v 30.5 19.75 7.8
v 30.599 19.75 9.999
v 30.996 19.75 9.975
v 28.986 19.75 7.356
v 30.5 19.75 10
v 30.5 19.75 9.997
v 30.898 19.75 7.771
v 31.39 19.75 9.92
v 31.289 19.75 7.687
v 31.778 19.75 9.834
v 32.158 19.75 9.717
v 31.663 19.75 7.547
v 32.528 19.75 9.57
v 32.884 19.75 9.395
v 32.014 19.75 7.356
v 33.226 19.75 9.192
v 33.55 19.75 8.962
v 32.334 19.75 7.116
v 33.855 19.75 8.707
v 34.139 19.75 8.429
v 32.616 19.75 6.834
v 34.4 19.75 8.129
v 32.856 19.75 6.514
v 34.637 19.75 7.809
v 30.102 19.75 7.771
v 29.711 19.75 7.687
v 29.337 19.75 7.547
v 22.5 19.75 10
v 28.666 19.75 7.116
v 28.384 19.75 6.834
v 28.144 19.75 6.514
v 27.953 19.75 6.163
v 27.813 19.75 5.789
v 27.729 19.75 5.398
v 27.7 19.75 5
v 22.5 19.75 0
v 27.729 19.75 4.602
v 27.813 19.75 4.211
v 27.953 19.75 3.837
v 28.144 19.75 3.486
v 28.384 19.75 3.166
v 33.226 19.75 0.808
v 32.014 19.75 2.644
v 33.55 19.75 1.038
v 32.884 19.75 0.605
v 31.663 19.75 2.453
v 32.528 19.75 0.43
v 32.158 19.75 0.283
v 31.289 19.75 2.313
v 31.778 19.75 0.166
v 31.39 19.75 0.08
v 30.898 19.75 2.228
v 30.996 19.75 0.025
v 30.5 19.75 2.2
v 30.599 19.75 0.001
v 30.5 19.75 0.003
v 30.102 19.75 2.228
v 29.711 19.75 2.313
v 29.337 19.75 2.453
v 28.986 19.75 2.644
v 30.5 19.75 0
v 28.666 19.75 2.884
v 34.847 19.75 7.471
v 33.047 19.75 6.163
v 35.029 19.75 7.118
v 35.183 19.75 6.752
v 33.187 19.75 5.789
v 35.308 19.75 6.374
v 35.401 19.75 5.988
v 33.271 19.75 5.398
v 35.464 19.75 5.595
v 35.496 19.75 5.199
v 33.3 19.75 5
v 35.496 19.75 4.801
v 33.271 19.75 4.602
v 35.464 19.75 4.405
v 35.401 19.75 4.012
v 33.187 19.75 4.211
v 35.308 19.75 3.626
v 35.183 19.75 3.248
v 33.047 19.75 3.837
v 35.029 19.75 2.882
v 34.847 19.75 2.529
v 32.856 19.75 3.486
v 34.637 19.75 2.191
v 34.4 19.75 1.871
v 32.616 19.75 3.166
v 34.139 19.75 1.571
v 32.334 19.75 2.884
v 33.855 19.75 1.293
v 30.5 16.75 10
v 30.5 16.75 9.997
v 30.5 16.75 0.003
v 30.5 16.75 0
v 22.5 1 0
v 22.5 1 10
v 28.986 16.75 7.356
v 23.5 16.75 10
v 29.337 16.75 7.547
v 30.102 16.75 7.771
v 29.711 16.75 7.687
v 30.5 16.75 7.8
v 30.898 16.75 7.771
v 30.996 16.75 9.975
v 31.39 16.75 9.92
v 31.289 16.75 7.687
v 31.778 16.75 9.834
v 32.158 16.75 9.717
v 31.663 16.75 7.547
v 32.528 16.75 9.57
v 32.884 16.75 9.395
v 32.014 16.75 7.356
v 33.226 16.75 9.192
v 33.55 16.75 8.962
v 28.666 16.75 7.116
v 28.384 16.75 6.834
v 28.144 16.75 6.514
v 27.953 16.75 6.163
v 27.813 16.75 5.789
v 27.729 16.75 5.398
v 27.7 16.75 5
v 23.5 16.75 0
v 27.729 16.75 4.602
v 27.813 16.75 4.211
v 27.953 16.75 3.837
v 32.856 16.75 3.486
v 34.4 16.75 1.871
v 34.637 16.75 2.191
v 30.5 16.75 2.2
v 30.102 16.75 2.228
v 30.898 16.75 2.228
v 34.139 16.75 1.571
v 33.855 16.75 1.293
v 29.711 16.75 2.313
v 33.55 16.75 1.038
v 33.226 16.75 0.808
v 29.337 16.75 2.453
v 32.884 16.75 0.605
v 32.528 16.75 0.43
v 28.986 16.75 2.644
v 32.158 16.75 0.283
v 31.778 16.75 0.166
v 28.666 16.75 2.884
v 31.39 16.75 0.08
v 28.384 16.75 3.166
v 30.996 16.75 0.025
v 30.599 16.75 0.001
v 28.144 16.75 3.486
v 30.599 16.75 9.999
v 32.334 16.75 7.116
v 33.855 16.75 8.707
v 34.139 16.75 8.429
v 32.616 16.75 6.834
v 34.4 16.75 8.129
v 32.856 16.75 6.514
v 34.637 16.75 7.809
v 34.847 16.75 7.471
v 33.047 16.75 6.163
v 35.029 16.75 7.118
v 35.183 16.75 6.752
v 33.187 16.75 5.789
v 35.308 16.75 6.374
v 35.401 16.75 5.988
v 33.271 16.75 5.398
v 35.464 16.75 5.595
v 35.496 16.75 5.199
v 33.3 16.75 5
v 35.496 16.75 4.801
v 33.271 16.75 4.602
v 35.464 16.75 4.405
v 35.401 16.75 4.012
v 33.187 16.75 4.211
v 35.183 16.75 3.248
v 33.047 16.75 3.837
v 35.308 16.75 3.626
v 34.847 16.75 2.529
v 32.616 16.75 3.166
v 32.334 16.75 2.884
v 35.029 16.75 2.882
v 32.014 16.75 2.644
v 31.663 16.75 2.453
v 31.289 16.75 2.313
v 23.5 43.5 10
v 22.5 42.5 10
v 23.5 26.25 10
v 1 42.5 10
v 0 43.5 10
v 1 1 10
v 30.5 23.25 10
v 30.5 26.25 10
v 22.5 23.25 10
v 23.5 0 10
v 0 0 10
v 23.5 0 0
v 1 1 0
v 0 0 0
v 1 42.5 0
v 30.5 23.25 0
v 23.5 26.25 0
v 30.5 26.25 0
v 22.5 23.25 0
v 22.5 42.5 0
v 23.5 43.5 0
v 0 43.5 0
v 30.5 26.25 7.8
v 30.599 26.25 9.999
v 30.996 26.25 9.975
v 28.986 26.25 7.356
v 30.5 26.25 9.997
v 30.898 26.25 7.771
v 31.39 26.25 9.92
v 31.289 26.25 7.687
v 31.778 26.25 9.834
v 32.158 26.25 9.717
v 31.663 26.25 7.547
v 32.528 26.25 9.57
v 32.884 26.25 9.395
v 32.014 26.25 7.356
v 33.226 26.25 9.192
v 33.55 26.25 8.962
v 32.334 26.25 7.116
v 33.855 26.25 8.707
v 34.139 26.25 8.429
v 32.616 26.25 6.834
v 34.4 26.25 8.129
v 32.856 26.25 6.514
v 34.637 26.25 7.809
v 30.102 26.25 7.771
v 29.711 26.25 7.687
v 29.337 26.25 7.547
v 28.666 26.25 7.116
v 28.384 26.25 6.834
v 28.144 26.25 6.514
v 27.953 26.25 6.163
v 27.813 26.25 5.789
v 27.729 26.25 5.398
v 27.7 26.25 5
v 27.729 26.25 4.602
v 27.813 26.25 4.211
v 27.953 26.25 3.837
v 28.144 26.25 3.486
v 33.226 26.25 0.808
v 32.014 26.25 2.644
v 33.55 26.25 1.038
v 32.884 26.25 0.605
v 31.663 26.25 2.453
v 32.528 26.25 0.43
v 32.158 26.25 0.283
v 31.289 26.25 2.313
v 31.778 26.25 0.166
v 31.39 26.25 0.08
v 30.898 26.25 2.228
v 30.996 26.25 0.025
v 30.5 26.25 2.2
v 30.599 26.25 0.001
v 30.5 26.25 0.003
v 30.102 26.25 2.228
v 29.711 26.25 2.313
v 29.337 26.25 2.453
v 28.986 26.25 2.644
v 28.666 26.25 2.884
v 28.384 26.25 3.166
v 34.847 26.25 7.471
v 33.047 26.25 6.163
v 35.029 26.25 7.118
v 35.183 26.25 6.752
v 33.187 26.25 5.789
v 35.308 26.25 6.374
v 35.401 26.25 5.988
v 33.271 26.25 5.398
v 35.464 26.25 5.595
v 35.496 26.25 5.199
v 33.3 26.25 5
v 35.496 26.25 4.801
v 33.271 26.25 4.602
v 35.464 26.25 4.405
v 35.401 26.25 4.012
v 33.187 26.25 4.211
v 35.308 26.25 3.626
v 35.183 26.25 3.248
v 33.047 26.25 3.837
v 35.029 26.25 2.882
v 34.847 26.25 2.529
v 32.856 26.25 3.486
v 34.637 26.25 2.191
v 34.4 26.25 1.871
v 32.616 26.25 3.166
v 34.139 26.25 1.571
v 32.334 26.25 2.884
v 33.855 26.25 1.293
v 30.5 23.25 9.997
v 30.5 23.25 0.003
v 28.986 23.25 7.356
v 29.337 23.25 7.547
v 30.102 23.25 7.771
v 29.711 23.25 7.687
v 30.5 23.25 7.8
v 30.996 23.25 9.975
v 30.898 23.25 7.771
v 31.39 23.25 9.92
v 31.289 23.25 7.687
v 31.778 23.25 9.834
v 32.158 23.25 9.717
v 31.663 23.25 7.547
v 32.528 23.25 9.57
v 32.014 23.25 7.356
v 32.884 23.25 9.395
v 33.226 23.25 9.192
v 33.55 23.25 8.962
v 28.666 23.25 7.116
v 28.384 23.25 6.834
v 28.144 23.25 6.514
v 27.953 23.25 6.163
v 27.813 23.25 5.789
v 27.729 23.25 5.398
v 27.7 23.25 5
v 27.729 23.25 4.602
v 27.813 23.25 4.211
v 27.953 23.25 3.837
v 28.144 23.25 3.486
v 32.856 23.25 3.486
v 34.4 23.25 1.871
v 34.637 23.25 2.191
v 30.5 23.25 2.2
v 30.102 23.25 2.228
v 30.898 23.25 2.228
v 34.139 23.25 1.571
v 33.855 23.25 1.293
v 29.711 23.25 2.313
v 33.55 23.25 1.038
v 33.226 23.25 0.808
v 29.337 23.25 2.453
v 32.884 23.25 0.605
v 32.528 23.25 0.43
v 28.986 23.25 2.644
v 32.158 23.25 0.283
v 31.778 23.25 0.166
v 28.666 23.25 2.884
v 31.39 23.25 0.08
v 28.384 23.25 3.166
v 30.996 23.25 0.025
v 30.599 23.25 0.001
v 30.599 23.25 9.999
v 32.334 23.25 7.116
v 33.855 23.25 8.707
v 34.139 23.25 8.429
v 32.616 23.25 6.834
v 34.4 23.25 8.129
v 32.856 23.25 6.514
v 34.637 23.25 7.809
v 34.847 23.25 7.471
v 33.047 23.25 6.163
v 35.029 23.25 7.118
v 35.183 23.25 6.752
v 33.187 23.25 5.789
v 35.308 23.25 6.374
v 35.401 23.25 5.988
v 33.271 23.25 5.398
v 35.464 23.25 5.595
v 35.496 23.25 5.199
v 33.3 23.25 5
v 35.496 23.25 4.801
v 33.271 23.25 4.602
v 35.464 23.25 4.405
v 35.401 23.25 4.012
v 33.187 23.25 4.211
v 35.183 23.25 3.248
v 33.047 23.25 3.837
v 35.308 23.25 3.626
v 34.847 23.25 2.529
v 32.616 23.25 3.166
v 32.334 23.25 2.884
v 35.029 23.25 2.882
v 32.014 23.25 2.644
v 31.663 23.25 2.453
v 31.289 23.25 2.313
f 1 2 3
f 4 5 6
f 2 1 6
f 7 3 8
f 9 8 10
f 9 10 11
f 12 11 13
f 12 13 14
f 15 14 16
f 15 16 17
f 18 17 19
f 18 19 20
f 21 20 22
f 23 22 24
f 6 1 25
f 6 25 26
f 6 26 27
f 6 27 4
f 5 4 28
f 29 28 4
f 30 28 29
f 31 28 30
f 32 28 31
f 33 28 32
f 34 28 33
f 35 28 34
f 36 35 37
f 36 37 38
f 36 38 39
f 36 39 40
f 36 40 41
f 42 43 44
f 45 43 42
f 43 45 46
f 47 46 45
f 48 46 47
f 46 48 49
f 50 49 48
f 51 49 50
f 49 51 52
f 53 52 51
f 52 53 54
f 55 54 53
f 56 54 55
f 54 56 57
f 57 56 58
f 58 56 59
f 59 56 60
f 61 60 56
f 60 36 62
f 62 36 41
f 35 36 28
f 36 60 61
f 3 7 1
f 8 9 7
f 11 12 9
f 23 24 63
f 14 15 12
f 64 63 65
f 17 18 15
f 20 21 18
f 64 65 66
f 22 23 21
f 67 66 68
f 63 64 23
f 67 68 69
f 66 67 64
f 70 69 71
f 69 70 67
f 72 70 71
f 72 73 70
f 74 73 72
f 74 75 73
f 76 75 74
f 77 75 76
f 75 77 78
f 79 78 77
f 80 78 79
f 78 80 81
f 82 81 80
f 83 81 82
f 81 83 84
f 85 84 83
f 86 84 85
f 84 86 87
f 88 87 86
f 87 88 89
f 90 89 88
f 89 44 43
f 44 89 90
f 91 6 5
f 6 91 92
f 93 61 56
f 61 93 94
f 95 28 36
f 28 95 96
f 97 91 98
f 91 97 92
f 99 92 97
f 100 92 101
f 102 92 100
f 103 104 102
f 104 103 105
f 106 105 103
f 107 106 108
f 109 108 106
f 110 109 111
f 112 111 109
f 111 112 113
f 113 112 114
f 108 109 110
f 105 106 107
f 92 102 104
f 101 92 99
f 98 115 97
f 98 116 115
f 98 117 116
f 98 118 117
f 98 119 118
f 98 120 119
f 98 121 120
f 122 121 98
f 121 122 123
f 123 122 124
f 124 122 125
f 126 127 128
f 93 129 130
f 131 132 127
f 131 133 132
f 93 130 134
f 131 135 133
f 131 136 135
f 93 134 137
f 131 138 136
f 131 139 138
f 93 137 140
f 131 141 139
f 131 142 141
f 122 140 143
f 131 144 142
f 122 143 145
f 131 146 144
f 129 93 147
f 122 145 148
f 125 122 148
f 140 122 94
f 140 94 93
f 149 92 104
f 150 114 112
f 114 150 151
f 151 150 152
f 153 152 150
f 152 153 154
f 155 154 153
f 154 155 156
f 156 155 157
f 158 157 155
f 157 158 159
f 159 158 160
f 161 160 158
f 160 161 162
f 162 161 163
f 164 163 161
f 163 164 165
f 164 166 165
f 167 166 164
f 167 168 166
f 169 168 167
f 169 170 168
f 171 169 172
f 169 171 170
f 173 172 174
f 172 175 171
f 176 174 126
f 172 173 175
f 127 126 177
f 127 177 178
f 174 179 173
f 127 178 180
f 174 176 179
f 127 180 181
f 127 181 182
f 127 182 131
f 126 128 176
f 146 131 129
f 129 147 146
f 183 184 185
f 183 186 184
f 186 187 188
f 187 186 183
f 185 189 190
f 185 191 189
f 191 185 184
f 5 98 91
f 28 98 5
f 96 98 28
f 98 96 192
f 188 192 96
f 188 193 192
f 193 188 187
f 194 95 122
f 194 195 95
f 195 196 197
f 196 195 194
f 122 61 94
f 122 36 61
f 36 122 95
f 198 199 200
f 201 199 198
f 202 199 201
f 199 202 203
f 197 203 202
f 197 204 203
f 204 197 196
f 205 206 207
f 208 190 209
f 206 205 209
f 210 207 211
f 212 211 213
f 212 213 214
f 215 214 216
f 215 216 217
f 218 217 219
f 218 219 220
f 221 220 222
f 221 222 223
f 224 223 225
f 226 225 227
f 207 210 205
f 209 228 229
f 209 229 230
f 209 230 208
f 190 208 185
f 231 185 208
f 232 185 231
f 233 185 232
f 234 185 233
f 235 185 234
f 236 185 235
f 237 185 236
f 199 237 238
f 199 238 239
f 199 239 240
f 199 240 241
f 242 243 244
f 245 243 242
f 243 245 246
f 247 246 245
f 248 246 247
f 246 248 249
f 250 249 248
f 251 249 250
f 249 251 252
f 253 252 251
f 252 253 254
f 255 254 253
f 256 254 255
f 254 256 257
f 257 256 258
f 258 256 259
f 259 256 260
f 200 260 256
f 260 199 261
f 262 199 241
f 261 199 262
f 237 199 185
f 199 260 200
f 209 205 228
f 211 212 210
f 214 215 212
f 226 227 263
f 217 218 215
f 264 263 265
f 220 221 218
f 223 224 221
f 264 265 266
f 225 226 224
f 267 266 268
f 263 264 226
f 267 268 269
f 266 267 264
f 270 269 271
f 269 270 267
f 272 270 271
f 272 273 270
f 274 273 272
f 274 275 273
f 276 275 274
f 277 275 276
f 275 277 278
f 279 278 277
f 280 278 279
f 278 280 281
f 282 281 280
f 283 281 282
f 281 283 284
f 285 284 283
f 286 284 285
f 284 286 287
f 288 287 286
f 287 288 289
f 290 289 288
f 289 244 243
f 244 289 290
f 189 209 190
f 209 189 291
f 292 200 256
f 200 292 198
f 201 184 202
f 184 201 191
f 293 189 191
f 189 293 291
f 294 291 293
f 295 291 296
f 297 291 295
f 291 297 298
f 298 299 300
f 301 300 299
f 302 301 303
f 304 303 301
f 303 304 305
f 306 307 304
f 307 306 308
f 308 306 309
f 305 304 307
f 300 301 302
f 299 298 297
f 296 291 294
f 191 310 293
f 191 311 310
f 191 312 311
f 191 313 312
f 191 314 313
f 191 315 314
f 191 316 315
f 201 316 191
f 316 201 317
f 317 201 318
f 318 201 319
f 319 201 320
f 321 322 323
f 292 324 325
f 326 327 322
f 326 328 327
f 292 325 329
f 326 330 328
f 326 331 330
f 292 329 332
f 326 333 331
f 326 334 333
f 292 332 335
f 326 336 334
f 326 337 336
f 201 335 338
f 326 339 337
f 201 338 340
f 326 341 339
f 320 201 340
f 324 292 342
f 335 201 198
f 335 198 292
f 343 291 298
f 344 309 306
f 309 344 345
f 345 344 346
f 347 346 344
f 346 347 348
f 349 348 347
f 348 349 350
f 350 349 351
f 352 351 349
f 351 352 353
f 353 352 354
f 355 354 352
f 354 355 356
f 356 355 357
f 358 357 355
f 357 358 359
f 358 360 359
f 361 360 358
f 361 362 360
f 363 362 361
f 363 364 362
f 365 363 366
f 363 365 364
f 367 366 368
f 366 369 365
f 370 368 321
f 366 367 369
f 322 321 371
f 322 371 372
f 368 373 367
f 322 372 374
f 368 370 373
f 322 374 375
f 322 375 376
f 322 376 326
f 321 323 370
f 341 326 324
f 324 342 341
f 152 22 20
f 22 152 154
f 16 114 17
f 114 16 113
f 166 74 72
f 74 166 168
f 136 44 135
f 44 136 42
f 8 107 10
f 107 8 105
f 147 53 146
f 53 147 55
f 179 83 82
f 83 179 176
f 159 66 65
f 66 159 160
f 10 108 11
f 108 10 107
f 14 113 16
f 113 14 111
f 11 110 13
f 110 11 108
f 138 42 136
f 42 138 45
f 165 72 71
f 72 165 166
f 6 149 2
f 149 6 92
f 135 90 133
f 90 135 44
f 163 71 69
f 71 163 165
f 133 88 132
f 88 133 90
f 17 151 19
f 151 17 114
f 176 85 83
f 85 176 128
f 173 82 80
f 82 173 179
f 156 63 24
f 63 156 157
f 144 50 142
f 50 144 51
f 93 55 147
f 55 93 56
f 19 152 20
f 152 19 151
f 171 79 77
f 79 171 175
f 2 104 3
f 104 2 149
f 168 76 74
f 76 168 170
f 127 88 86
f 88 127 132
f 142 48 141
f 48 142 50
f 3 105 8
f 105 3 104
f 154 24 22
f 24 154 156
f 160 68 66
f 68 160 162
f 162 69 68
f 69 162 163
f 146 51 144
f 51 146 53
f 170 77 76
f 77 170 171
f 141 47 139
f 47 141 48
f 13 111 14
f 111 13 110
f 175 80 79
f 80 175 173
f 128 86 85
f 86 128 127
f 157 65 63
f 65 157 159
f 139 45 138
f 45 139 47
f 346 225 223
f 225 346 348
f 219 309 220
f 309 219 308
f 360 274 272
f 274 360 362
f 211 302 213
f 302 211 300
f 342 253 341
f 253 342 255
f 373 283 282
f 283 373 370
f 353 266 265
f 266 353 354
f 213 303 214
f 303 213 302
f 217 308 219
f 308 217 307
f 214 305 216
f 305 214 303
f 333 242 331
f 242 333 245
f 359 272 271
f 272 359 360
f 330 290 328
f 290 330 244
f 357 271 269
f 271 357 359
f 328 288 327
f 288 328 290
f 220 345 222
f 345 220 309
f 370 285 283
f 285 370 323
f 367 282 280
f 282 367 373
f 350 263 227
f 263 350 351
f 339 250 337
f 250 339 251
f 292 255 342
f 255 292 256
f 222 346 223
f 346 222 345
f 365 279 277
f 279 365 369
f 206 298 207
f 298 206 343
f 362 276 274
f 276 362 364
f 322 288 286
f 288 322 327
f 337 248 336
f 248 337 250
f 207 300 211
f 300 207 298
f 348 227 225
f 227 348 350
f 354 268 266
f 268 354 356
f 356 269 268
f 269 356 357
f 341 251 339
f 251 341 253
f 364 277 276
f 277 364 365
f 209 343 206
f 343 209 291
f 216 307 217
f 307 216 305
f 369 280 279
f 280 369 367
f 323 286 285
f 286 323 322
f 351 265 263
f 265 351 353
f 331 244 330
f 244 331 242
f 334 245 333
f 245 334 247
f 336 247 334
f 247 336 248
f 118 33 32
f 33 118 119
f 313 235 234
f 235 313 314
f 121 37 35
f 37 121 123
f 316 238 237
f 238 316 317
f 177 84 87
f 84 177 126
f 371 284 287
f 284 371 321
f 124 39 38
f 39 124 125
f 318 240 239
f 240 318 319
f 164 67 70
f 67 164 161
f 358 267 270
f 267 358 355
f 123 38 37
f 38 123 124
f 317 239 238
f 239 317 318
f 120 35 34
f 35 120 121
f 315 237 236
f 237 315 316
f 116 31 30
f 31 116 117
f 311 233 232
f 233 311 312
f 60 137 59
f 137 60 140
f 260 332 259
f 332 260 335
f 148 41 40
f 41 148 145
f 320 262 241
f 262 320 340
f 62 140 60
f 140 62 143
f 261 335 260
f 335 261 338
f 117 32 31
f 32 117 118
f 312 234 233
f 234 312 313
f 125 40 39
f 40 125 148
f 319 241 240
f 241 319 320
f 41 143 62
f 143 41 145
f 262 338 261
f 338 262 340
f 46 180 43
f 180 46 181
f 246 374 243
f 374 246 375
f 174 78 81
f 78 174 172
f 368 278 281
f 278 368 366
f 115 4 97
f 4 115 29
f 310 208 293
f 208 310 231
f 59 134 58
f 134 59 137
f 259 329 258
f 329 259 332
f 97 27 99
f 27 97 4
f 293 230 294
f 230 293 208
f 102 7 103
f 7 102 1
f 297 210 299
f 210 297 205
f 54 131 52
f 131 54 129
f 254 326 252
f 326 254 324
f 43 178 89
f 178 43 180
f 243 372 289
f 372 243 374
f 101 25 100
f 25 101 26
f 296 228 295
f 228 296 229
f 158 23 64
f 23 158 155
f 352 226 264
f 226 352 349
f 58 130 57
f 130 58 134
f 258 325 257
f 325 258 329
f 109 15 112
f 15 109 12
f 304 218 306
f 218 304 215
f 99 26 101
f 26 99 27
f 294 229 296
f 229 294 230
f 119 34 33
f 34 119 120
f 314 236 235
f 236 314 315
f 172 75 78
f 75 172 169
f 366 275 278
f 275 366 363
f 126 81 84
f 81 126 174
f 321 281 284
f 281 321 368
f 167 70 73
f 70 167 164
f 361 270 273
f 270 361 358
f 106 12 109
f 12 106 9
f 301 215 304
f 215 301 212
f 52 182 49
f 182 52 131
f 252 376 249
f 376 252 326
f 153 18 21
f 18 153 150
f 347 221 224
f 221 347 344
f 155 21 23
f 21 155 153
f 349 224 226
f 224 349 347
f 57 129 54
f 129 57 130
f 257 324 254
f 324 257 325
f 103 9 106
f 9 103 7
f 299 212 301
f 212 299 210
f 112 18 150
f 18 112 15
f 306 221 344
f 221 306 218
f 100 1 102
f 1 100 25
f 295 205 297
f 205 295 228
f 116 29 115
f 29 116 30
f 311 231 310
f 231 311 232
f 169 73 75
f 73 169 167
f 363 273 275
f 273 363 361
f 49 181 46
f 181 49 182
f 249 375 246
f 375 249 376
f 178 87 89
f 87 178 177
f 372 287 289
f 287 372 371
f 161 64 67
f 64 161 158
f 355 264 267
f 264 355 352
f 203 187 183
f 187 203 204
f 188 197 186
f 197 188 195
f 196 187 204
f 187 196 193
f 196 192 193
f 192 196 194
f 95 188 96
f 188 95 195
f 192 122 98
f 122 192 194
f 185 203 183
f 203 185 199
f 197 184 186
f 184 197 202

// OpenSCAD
$fs=0.4; // def 1, 0.2 is high res
$fa=4;//def 12, 3 is very nice
%translate([0,0,-0.5])cube([200,200,1],center=true); //build platform

gph = 41.5;
gpd = 21.5;
z_thick = 1;

rotate([90,0,90]) {
cube([gph+(z_thick*2),10,z_thick]); //front

cube([z_thick,10,gpd+(z_thick*2)]); //side L
translate([gph+z_thick,0,0]) cube([z_thick,10,gpd+(z_thick*2)]); //side L

translate([0,0,gpd+z_thick]) cube([(gph/2)-1.5,10,z_thick]); //top
translate([(gph/2)+(z_thick*2)+.5,0,gpd+z_thick]) cube([(gph/2)-.5,10,z_thick]); //top

difference() {
union() {
	translate([(gph/2)-4,0,gpd+z_thick]) cube([3,10,8]); //mount
	translate([(gph/2)+2.5,0,gpd+z_thick]) cube([3,10,8]); //mount

	translate([(gph/2)-4,5,gpd+z_thick+8]) rotate([0,90,0]) cylinder (3,5,5); //mount
	translate([(gph/2)+2.5,5,gpd+z_thick+8]) rotate([0,90,0]) cylinder (3,5,5); //mount
}
	translate([(gph/2)-15,5,gpd+z_thick+8]) rotate([0,90,0]) cylinder (30,2.8,2.8); //screw hole
}
}
